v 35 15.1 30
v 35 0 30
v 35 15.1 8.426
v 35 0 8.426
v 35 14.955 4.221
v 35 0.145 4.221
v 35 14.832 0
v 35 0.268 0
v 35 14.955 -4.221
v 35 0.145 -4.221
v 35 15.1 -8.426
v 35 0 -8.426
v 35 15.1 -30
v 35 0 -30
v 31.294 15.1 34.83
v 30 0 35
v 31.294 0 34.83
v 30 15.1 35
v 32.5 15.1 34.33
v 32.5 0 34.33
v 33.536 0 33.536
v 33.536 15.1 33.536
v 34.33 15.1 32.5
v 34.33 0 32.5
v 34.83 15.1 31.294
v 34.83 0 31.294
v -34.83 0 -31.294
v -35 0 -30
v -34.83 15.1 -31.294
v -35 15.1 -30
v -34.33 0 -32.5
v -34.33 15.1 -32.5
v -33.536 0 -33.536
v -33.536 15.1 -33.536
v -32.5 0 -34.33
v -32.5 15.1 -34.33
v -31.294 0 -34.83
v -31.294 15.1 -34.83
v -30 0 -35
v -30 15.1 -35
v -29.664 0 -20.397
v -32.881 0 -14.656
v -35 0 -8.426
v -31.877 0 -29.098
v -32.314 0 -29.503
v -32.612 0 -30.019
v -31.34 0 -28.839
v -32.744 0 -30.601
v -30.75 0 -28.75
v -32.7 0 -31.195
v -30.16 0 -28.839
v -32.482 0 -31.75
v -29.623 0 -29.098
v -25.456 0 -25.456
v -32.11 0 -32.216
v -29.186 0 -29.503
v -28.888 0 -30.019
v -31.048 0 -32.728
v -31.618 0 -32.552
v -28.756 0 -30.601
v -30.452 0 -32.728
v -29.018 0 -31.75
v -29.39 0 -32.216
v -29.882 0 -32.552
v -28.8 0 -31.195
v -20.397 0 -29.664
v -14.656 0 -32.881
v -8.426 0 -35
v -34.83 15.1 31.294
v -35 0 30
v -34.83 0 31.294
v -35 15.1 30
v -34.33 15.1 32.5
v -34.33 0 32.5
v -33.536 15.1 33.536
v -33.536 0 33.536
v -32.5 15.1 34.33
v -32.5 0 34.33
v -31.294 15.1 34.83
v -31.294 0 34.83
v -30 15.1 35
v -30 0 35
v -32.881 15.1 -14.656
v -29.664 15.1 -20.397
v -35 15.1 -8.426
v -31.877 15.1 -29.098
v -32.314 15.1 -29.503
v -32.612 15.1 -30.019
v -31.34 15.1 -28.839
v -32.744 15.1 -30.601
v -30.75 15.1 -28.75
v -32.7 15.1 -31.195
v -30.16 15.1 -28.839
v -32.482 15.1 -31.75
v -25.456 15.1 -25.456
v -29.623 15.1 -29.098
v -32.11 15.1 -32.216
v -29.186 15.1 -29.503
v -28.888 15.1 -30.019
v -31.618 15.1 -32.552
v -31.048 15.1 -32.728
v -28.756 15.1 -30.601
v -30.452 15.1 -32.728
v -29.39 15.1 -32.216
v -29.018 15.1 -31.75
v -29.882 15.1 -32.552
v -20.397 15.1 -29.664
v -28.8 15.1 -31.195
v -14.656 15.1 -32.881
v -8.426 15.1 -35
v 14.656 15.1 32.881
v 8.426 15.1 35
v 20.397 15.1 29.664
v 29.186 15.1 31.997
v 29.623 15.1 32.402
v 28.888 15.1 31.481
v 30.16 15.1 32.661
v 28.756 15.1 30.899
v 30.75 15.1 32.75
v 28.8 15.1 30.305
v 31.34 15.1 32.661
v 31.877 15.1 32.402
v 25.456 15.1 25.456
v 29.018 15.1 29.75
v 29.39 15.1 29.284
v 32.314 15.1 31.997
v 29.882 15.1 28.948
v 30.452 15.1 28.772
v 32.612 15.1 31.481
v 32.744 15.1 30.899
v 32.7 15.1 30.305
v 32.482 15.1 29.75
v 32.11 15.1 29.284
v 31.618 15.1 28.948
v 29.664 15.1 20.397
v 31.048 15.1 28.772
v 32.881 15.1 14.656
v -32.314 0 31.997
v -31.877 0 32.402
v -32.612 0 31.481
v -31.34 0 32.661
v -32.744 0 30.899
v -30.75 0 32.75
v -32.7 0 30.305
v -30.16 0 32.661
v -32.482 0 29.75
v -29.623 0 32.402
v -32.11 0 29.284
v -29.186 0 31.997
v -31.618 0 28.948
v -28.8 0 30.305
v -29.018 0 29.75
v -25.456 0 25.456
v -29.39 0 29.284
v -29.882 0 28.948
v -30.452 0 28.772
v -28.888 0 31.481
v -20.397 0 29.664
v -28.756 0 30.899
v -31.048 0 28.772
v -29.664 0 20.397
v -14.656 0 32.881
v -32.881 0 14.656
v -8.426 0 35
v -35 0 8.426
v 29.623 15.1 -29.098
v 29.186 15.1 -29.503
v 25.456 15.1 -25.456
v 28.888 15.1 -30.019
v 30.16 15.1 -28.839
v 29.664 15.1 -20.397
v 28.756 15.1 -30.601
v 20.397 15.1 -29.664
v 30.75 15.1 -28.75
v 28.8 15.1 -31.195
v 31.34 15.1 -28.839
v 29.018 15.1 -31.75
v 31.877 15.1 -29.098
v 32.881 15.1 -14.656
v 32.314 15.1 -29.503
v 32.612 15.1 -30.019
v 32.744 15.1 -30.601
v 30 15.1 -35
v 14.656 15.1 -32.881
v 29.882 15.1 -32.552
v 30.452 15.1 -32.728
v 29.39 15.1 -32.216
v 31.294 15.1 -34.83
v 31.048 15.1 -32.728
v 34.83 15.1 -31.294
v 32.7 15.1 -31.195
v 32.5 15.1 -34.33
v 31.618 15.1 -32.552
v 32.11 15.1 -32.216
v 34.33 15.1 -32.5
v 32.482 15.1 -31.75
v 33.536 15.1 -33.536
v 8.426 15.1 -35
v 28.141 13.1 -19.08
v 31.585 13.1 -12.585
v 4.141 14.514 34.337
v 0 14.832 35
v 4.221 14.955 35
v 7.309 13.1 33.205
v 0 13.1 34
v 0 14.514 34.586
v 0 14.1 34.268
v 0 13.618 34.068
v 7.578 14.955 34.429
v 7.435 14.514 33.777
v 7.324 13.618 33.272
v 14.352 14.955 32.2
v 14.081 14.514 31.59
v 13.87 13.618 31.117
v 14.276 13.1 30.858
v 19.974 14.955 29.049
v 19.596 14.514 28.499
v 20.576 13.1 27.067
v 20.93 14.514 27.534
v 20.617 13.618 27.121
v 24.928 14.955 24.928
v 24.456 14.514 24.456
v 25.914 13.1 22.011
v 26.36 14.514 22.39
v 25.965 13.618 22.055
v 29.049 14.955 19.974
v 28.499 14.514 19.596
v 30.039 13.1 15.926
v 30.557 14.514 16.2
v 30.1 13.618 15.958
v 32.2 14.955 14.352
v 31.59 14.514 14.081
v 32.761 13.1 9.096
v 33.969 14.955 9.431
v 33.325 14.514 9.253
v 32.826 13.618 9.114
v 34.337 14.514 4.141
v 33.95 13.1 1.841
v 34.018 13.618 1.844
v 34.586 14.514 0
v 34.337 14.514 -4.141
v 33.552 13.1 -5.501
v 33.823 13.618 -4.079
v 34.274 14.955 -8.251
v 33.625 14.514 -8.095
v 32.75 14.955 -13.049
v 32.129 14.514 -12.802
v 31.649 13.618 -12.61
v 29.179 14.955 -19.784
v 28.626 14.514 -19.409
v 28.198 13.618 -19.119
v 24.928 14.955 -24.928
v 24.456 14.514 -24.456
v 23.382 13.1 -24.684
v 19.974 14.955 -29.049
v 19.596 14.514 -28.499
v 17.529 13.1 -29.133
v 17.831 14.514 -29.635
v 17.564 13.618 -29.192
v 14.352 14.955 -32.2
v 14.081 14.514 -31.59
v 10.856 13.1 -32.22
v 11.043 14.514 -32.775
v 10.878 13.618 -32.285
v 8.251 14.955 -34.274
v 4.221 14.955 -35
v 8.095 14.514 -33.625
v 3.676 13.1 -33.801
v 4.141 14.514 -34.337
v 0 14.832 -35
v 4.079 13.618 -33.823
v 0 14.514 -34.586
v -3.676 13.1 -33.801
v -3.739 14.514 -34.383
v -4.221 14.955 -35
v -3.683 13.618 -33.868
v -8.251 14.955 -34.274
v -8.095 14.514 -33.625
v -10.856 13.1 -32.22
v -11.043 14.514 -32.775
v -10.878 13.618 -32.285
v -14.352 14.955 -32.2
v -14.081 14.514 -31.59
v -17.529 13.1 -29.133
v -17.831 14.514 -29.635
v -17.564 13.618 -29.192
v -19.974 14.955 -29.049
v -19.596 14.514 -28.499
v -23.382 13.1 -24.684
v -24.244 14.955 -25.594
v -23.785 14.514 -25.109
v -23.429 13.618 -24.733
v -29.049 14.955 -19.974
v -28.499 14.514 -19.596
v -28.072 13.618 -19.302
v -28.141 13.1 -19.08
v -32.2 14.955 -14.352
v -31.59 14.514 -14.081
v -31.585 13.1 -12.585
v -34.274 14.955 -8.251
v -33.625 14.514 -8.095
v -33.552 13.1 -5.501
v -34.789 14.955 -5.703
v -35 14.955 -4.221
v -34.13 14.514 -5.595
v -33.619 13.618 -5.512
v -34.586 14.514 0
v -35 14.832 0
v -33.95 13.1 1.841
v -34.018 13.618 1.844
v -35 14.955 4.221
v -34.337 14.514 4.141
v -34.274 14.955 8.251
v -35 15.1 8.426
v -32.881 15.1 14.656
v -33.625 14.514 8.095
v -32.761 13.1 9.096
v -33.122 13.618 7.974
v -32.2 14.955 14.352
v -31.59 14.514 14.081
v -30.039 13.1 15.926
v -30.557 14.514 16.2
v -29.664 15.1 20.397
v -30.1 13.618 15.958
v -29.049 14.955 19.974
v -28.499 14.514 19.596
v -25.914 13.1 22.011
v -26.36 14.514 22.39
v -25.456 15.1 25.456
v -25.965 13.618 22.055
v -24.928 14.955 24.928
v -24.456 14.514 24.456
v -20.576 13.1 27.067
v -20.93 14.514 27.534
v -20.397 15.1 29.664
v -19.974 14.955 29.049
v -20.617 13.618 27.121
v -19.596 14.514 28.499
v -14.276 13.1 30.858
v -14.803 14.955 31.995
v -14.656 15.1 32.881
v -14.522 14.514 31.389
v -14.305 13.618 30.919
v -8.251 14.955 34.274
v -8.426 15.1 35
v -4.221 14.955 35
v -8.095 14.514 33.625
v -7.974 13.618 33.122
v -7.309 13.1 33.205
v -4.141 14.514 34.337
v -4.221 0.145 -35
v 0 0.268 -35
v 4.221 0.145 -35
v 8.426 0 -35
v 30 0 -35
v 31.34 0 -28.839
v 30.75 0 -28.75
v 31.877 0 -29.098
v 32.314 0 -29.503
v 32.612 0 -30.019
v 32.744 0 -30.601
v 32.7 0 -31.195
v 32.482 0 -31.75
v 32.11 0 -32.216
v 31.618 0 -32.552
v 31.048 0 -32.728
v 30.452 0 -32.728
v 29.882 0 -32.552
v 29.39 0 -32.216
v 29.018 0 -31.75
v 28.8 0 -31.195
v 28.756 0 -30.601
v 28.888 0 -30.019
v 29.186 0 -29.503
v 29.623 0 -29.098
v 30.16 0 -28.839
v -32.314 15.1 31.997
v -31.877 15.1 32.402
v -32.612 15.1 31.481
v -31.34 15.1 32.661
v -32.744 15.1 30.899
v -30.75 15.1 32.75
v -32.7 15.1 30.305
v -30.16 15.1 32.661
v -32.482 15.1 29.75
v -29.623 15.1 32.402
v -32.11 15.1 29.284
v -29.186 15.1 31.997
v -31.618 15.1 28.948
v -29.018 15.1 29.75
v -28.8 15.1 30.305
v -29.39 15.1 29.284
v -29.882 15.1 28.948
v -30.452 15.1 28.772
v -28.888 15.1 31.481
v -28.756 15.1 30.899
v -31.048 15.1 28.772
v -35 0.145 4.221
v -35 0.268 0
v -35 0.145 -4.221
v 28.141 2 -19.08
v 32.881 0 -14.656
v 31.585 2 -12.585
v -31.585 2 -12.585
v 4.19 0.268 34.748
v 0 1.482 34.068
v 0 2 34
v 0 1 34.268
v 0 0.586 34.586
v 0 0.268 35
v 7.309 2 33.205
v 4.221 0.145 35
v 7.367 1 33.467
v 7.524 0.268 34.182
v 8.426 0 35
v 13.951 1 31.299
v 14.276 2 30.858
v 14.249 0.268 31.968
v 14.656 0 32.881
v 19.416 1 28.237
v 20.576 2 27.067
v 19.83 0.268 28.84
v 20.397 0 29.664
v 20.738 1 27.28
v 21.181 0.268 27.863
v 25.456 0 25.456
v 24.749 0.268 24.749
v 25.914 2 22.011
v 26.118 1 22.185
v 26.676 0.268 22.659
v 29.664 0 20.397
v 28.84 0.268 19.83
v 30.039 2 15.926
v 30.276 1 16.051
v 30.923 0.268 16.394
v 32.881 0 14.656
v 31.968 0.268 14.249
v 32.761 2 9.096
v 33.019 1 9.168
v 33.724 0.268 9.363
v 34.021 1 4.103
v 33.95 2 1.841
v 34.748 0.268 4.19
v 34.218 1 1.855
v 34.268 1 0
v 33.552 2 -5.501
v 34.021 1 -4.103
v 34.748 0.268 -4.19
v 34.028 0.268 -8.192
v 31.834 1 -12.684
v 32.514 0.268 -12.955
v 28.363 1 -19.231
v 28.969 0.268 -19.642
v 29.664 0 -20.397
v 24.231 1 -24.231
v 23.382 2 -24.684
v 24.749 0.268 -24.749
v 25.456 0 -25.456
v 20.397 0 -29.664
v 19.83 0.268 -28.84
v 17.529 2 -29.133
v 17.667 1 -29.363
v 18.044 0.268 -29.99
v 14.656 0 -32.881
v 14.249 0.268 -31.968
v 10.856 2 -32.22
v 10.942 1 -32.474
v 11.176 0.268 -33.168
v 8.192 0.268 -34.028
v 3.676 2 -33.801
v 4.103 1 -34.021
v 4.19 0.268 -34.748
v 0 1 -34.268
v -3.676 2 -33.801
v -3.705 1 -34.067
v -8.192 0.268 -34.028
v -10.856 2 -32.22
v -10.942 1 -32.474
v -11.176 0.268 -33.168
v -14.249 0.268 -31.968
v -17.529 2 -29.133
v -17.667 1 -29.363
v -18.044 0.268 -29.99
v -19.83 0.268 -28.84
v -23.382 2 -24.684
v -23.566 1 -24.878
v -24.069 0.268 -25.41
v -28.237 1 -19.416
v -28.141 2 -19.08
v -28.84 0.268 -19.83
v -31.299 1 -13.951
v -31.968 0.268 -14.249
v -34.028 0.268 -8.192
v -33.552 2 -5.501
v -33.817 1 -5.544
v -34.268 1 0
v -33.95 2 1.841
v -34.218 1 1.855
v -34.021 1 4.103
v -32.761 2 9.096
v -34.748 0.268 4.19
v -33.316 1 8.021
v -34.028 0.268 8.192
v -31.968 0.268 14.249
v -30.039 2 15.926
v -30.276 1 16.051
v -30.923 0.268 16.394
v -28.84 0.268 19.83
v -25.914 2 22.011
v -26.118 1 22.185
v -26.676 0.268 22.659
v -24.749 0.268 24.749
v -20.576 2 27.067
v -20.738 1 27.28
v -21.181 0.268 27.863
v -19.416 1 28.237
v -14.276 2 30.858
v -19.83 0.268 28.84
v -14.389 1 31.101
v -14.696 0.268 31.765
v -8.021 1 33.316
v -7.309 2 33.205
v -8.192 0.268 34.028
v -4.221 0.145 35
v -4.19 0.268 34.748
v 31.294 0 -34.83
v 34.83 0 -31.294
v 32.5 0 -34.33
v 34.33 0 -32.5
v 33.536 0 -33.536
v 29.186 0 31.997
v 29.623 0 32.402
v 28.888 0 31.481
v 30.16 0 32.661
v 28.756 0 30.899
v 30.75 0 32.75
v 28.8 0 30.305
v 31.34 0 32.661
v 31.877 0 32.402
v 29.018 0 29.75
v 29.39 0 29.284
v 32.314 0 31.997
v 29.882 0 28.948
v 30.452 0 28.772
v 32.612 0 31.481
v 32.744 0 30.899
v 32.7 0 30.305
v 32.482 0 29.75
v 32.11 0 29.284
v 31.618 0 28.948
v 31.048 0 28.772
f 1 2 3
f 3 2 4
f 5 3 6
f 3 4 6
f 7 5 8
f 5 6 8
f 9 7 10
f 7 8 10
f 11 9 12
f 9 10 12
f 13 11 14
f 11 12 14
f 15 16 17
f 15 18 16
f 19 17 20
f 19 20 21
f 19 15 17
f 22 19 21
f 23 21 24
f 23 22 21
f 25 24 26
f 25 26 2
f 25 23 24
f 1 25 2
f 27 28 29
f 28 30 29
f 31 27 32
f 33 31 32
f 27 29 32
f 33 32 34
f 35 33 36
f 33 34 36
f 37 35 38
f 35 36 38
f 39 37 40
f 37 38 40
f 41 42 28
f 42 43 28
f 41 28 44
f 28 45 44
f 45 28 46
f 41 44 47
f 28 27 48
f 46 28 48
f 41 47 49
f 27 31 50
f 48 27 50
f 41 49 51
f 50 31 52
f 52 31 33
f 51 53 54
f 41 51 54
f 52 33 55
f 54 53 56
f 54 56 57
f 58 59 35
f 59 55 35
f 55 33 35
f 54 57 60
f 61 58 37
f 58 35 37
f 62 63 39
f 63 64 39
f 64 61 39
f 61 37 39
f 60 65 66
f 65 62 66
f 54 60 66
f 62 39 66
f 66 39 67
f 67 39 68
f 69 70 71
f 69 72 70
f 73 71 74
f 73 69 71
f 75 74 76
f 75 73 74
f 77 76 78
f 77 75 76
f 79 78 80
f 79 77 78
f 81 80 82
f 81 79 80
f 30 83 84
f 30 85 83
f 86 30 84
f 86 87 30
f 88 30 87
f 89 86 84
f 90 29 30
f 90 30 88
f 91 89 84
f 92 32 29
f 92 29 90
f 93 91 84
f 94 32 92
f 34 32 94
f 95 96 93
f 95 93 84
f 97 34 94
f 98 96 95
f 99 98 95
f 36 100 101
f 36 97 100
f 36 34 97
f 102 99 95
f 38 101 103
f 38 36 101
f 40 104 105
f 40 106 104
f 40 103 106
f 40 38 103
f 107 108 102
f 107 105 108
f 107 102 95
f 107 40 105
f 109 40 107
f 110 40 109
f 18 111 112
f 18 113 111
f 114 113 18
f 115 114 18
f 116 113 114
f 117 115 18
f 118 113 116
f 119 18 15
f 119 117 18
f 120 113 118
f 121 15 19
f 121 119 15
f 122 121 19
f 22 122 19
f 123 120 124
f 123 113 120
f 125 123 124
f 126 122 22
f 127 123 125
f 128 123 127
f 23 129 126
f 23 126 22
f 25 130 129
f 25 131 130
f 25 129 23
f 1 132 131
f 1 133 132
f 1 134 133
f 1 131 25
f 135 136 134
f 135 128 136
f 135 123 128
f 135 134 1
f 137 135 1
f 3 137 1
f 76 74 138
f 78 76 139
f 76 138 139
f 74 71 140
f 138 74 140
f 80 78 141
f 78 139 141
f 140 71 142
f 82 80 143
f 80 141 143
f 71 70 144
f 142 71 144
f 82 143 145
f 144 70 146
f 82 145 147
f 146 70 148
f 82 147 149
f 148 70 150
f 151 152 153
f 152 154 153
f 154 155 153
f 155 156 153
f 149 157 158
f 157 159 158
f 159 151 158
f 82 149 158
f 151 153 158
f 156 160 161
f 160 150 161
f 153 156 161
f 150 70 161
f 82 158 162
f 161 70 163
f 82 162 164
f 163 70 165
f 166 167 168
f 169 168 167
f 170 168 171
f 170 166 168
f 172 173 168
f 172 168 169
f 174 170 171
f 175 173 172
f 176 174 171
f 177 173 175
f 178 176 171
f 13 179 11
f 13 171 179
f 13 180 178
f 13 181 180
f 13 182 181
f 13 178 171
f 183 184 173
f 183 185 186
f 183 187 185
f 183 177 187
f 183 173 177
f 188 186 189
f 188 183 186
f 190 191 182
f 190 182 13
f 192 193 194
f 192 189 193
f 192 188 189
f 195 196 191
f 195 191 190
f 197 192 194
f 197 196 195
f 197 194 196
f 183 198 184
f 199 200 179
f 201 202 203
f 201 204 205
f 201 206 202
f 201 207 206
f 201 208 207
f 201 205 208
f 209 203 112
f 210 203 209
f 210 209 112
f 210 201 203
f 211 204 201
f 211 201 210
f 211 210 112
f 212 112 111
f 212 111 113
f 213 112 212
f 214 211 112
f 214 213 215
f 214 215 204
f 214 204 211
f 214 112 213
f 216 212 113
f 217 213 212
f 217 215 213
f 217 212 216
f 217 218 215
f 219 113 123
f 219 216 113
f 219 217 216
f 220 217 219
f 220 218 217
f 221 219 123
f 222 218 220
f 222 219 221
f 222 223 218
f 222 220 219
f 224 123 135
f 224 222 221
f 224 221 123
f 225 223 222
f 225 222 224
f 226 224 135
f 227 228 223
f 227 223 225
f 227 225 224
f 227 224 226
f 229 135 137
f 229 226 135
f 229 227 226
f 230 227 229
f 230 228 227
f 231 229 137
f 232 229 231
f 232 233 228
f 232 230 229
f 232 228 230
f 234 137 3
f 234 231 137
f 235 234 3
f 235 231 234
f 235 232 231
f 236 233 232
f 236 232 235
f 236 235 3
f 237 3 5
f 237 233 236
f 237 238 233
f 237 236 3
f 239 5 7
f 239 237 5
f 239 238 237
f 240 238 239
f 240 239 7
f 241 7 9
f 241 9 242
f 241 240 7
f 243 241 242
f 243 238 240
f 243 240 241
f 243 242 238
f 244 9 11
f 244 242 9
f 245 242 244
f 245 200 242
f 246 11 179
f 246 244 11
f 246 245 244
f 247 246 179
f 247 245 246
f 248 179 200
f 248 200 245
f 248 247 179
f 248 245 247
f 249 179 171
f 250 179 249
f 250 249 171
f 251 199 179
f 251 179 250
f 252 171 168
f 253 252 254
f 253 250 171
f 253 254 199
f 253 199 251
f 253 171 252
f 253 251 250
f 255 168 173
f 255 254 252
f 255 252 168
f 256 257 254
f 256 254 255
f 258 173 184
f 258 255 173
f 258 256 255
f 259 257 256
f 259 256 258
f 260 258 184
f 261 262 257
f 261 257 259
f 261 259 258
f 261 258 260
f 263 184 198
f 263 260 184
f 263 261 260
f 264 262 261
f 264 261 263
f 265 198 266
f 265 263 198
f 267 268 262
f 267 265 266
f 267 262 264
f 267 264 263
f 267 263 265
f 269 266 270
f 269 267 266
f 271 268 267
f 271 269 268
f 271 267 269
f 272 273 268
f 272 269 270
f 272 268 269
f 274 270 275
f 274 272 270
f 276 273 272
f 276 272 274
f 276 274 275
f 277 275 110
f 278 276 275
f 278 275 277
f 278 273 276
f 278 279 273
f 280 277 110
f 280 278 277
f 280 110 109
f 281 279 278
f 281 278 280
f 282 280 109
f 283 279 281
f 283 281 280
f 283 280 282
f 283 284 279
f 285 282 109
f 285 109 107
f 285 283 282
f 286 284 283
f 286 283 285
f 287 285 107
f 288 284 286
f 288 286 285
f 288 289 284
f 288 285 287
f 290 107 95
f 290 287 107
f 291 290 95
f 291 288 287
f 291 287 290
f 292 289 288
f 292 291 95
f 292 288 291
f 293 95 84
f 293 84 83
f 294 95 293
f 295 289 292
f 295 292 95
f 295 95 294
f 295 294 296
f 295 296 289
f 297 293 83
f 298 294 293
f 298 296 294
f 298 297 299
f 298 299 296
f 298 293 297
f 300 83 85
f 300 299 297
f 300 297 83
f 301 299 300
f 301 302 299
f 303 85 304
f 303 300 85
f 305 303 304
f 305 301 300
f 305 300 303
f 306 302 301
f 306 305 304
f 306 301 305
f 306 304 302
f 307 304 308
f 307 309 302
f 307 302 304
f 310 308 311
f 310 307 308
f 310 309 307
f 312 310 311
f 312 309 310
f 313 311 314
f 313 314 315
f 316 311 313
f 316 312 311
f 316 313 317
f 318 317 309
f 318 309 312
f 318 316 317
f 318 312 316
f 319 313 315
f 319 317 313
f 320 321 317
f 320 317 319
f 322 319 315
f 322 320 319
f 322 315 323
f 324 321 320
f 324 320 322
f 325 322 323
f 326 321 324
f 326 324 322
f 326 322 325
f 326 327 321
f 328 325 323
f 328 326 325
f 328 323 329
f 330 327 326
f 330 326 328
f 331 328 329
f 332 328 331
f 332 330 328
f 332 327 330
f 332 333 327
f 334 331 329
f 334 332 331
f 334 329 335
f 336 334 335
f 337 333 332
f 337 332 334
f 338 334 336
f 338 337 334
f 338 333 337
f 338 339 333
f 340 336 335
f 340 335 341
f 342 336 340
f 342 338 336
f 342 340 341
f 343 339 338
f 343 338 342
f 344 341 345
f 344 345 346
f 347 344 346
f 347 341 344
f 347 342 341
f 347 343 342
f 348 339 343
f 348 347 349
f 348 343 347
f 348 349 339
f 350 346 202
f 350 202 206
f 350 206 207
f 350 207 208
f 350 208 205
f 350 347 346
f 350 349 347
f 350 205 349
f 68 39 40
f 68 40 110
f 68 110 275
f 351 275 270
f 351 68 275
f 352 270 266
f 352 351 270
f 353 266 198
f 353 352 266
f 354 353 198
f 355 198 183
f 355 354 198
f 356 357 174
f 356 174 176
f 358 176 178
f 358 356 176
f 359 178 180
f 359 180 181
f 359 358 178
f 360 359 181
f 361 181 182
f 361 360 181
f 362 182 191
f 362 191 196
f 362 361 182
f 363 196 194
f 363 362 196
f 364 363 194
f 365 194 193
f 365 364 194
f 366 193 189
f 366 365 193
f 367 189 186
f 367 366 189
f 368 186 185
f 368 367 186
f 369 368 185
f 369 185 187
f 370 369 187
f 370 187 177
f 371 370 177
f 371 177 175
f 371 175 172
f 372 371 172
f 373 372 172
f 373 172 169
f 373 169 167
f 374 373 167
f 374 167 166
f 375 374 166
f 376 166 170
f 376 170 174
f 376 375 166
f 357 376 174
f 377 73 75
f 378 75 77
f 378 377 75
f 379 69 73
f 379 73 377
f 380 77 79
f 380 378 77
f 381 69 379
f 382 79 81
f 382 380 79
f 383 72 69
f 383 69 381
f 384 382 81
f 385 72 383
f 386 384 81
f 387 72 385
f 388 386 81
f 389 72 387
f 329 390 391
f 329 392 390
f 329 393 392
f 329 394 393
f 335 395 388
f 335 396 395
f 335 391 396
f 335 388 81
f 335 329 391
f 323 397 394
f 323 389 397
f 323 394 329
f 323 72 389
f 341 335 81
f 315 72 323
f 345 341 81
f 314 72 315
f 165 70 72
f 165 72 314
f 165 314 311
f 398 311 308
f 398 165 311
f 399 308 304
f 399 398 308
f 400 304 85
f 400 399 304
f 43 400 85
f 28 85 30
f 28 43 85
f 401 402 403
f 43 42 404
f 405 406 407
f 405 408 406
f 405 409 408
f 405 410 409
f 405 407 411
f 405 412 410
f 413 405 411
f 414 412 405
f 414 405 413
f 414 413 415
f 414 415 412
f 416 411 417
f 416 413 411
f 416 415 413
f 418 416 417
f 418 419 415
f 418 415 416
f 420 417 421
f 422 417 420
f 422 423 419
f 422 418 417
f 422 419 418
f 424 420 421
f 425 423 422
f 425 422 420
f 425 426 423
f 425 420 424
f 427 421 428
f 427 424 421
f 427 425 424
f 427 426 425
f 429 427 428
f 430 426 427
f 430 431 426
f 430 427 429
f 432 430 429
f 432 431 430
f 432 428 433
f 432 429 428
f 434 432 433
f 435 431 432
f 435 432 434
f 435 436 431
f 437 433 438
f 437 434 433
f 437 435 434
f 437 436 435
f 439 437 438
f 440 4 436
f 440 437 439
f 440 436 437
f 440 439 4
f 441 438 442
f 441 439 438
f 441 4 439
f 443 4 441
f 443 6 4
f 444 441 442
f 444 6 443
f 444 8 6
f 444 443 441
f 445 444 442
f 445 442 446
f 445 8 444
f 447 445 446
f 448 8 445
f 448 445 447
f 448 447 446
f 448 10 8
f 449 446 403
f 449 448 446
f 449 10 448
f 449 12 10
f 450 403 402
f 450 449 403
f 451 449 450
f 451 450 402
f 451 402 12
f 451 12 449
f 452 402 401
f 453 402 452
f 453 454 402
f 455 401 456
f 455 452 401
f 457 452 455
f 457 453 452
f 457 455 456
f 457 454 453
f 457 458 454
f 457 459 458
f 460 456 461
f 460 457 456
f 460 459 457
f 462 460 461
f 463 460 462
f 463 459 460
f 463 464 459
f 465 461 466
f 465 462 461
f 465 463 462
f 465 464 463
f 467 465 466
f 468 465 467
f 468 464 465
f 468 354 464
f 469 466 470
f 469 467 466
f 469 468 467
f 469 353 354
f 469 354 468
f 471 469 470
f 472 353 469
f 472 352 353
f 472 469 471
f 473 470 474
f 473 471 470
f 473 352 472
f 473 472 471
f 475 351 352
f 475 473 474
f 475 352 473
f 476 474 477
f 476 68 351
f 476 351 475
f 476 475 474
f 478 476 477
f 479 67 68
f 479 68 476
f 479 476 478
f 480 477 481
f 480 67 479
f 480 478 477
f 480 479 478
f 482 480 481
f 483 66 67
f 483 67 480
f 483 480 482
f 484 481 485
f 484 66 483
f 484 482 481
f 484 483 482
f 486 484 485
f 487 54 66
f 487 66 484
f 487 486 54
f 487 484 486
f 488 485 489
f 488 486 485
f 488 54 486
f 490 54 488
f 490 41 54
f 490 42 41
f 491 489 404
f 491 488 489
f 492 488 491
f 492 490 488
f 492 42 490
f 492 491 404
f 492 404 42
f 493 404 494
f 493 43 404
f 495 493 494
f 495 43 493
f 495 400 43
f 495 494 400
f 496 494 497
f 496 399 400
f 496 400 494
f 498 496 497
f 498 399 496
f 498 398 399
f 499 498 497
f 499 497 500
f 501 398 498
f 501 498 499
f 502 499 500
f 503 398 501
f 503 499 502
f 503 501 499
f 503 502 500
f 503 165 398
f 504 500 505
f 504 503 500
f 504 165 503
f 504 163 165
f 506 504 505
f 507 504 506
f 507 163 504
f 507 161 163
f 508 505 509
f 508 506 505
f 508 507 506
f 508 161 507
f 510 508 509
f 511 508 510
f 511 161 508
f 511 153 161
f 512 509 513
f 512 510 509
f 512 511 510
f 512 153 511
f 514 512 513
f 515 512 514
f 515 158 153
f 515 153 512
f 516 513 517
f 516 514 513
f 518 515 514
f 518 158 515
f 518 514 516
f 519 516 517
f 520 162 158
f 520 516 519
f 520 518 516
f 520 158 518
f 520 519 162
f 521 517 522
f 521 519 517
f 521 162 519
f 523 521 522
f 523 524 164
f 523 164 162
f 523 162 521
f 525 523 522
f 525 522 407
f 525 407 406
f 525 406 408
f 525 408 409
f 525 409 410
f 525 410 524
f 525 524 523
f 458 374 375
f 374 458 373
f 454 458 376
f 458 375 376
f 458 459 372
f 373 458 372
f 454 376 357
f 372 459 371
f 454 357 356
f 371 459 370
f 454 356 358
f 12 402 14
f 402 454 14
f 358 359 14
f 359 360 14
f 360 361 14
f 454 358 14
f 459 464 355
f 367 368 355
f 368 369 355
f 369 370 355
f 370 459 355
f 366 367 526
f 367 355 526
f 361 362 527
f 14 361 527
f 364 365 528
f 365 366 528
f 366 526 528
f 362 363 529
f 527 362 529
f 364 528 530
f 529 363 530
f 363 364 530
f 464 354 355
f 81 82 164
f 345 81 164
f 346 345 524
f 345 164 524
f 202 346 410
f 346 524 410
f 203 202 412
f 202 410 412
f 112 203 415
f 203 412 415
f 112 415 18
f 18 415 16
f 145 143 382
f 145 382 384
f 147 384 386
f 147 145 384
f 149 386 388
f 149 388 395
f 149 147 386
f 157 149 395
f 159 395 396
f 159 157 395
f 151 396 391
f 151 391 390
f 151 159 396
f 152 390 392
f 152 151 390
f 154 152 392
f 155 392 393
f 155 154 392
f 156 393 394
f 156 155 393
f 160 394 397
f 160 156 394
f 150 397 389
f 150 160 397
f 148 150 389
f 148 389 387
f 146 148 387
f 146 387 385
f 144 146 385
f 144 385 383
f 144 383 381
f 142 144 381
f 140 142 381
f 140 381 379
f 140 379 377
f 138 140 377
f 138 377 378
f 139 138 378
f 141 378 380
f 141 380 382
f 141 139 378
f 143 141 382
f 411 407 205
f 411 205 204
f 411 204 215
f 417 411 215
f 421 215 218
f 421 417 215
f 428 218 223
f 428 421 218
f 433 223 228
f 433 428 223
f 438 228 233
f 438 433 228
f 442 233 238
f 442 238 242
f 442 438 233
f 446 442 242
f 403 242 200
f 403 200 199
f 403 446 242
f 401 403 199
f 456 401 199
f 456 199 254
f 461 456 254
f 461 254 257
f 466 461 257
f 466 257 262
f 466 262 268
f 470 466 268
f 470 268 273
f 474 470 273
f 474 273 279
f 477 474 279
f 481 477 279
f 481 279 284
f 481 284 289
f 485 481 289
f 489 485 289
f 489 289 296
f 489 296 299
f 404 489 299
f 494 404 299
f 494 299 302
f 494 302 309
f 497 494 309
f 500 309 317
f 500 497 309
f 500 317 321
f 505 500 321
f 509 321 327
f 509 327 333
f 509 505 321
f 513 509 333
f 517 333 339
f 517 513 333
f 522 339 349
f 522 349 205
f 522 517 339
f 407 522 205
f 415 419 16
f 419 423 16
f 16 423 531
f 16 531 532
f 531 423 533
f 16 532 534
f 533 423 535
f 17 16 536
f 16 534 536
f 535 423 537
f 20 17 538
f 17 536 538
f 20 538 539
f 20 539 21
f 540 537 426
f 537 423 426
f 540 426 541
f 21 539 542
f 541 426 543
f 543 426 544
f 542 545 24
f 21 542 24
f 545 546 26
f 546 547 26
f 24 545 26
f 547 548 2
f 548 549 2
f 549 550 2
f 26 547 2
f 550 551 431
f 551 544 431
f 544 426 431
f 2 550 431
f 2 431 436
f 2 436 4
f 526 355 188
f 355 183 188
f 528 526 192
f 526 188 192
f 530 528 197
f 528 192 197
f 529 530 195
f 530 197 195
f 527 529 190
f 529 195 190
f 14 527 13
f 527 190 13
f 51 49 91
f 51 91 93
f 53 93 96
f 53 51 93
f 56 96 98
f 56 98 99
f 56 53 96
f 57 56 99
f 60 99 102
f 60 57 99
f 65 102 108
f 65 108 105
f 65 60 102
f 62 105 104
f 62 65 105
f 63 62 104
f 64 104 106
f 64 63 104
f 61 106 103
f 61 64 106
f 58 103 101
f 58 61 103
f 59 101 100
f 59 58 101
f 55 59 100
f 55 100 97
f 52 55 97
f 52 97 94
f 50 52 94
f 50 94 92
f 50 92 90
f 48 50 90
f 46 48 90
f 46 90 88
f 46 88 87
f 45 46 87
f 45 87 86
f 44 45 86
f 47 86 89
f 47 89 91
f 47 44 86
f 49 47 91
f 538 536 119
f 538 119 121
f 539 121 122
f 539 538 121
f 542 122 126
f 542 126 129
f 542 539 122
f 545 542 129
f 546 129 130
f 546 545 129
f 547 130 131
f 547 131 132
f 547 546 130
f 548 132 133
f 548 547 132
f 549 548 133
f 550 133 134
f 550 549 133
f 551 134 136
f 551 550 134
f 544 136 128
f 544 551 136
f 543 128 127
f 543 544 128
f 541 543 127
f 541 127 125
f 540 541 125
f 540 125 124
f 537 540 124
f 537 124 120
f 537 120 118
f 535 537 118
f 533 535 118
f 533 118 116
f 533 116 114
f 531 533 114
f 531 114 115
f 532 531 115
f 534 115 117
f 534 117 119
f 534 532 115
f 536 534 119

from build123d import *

# Parameters (mm, degrees)
SKETCH_1_W      = 70
SKETCH_1_H      = 70
SKETCH_1_R      = 2
SKETCH_1_R_2    = 34
EXTRUDE_1_DEPTH = 15.1
FILLET_1_R      = 5
FILLET_2_R      = 2


with BuildPart() as part:
    # Эскиз1 → Бобышка-Вытянуть1 (new body)
    with BuildSketch(Plane(origin=(0, 0, 0), x_dir=(1, 0, 0), z_dir=(0, 1, 0))):
        Rectangle(SKETCH_1_W, SKETCH_1_H)
        with Locations(Location((30.75, 30.75, 0), (0, 0, 270))):
            Circle(SKETCH_1_R, mode=Mode.SUBTRACT)
        with Locations(Location((0, 0, 0), (0, 0, 270))):
            Circle(SKETCH_1_R_2, mode=Mode.SUBTRACT)
        with Locations(Location((30.75, -30.75, 0), (0, 0, 270))):
            Circle(SKETCH_1_R, mode=Mode.SUBTRACT)
        with Locations(Location((-30.75, -30.75, 0), (0, 0, 270))):
            Circle(SKETCH_1_R, mode=Mode.SUBTRACT)
        with Locations(Location((-30.75, 30.75, 0), (0, 0, 270))):
            Circle(SKETCH_1_R, mode=Mode.SUBTRACT)
    extrude(amount=EXTRUDE_1_DEPTH)

    # Скругление1
    fillet_1_edges = [part.edges().sort_by_distance(p)[0] for p in [
        (35, 7.55, 35),
        (-35, 7.55, 35),
        (-35, 7.55, -35),
        (35, 7.55, -35),
    ]]
    fillet(fillet_1_edges, radius=FILLET_1_R)

    # Скругление2
    # the kernel refuses this fillet: 2 mm, written as the material it takes off along each edge
    with BuildSketch(Plane(origin=(0, 0, 0), x_dir=(0, 0, 1), z_dir=(-1, 0, 0))) as fillet_2_piece_1:
        with BuildLine():
            CenterArc((34 + FILLET_2_R, FILLET_2_R), FILLET_2_R, 180, 90)
            Line((34, FILLET_2_R), (34, 0))
            Line((34, 0), (34 + FILLET_2_R, 0))
        make_face()
    revolve(axis=Axis((0, 0, 0), (0, 1, 0)), mode=Mode.SUBTRACT)
    with BuildSketch(Plane(origin=(0, 15.1, 0), x_dir=(0, 0, 1), z_dir=(-1, 0, 0))) as fillet_2_piece_2:
        with BuildLine():
            CenterArc((34 + FILLET_2_R, -FILLET_2_R), FILLET_2_R, 90, 90)
            Line((34, -FILLET_2_R), (34, 0))
            Line((34, 0), (34 + FILLET_2_R, 0))
        make_face()
    revolve(axis=Axis((0, 15.1, 0), (0, 1, 0)), mode=Mode.SUBTRACT)


solid = part.part
